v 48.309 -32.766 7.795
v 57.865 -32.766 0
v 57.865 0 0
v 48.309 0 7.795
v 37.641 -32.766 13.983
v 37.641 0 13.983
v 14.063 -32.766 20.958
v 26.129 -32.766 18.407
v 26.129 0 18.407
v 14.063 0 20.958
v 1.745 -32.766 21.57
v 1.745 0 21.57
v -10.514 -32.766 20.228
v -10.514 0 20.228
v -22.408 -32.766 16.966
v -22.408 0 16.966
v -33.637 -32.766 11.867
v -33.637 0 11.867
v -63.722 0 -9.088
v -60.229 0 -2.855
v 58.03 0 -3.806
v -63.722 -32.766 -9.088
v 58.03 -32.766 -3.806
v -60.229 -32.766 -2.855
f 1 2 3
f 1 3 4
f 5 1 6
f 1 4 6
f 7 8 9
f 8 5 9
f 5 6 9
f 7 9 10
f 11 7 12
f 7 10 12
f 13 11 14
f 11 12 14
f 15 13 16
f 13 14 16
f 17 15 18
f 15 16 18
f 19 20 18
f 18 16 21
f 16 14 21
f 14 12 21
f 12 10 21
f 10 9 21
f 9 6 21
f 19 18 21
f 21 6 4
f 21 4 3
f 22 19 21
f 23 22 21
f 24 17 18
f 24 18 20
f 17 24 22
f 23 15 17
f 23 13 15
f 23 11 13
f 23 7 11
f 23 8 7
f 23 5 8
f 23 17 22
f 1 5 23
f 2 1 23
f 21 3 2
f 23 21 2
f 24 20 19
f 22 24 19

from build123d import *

# Parameters (mm, degrees)
F1_DEPTH    = 32.766
F2_T1_DEPTH = 555.7105242514
F3_DEPTH    = 3.81
F4_T1_DEPTH = 59.0353369856


# Not quite as in the source:
# - a fillet or chamfer that OpenCascade refuses, or shapes differently, is made with other operations: its cross-section is extruded or revolved along the edge and cut away or added


with BuildPart() as f1:
    # F0 (on Front) → F1 (new body)
    with BuildSketch(Plane.XZ):
        Polygon((57.8652285039, 0), (57.8652285039, 62.5251382589), (-64.6729022264, -5.3159417585), align=None)
    extrude(amount=F1_DEPTH)

    # F2: fillet of radius 77.8169467068 on 1 edges, made by hand

    # F2_s2 → F2_t1 (cut)
    with BuildSketch(Plane.XZ.offset(-261.4722621257)):
        with BuildLine():
            ThreePointArc((57.8652285039, 0), (14.0628423673, 20.9577145427), (-33.6365297354, 11.8667997855))
            Line((-33.6365297354, 11.8667997855), (-34.3903529504, 13.228394967))
            Line((-34.3903529504, 13.228394967), (57.111405289, 63.8867334405))
            Line((57.111405289, 63.8867334405), (59.4215674381, 62.5251382589))
            ThreePointArc((59.4215674381, 62.5251382589), (59.4215674381, 31.2625691295), (58.9414404538, 1.1242591859))
            Line((58.9414404538, 1.1242591859), (57.8652285039, 0))
        make_face()
    extrude(amount=F2_T1_DEPTH, mode=Mode.SUBTRACT)

    # F3 (add): a face of the model
    f3_faces = [f1.faces().sort_by_distance(p)[0] for p in [
        (-3.4038368613, -16.383, -2.6579708792),
    ]]
    extrude(f3_faces, amount=F3_DEPTH)

    # F4: chamfer of 5.08 on 1 edges, made by hand

    # F4_s2 → F4_t1 (cut)
    with BuildSketch(Plane.XZ.offset(-13.1346684928)):
        Polygon((-60.2285595639, -2.8554096417), (-64.4527290592, -10.3911682338), (-64.6729022264, -5.3159417585), align=None)
    extrude(amount=F4_T1_DEPTH, mode=Mode.SUBTRACT)


solid = f1.part
